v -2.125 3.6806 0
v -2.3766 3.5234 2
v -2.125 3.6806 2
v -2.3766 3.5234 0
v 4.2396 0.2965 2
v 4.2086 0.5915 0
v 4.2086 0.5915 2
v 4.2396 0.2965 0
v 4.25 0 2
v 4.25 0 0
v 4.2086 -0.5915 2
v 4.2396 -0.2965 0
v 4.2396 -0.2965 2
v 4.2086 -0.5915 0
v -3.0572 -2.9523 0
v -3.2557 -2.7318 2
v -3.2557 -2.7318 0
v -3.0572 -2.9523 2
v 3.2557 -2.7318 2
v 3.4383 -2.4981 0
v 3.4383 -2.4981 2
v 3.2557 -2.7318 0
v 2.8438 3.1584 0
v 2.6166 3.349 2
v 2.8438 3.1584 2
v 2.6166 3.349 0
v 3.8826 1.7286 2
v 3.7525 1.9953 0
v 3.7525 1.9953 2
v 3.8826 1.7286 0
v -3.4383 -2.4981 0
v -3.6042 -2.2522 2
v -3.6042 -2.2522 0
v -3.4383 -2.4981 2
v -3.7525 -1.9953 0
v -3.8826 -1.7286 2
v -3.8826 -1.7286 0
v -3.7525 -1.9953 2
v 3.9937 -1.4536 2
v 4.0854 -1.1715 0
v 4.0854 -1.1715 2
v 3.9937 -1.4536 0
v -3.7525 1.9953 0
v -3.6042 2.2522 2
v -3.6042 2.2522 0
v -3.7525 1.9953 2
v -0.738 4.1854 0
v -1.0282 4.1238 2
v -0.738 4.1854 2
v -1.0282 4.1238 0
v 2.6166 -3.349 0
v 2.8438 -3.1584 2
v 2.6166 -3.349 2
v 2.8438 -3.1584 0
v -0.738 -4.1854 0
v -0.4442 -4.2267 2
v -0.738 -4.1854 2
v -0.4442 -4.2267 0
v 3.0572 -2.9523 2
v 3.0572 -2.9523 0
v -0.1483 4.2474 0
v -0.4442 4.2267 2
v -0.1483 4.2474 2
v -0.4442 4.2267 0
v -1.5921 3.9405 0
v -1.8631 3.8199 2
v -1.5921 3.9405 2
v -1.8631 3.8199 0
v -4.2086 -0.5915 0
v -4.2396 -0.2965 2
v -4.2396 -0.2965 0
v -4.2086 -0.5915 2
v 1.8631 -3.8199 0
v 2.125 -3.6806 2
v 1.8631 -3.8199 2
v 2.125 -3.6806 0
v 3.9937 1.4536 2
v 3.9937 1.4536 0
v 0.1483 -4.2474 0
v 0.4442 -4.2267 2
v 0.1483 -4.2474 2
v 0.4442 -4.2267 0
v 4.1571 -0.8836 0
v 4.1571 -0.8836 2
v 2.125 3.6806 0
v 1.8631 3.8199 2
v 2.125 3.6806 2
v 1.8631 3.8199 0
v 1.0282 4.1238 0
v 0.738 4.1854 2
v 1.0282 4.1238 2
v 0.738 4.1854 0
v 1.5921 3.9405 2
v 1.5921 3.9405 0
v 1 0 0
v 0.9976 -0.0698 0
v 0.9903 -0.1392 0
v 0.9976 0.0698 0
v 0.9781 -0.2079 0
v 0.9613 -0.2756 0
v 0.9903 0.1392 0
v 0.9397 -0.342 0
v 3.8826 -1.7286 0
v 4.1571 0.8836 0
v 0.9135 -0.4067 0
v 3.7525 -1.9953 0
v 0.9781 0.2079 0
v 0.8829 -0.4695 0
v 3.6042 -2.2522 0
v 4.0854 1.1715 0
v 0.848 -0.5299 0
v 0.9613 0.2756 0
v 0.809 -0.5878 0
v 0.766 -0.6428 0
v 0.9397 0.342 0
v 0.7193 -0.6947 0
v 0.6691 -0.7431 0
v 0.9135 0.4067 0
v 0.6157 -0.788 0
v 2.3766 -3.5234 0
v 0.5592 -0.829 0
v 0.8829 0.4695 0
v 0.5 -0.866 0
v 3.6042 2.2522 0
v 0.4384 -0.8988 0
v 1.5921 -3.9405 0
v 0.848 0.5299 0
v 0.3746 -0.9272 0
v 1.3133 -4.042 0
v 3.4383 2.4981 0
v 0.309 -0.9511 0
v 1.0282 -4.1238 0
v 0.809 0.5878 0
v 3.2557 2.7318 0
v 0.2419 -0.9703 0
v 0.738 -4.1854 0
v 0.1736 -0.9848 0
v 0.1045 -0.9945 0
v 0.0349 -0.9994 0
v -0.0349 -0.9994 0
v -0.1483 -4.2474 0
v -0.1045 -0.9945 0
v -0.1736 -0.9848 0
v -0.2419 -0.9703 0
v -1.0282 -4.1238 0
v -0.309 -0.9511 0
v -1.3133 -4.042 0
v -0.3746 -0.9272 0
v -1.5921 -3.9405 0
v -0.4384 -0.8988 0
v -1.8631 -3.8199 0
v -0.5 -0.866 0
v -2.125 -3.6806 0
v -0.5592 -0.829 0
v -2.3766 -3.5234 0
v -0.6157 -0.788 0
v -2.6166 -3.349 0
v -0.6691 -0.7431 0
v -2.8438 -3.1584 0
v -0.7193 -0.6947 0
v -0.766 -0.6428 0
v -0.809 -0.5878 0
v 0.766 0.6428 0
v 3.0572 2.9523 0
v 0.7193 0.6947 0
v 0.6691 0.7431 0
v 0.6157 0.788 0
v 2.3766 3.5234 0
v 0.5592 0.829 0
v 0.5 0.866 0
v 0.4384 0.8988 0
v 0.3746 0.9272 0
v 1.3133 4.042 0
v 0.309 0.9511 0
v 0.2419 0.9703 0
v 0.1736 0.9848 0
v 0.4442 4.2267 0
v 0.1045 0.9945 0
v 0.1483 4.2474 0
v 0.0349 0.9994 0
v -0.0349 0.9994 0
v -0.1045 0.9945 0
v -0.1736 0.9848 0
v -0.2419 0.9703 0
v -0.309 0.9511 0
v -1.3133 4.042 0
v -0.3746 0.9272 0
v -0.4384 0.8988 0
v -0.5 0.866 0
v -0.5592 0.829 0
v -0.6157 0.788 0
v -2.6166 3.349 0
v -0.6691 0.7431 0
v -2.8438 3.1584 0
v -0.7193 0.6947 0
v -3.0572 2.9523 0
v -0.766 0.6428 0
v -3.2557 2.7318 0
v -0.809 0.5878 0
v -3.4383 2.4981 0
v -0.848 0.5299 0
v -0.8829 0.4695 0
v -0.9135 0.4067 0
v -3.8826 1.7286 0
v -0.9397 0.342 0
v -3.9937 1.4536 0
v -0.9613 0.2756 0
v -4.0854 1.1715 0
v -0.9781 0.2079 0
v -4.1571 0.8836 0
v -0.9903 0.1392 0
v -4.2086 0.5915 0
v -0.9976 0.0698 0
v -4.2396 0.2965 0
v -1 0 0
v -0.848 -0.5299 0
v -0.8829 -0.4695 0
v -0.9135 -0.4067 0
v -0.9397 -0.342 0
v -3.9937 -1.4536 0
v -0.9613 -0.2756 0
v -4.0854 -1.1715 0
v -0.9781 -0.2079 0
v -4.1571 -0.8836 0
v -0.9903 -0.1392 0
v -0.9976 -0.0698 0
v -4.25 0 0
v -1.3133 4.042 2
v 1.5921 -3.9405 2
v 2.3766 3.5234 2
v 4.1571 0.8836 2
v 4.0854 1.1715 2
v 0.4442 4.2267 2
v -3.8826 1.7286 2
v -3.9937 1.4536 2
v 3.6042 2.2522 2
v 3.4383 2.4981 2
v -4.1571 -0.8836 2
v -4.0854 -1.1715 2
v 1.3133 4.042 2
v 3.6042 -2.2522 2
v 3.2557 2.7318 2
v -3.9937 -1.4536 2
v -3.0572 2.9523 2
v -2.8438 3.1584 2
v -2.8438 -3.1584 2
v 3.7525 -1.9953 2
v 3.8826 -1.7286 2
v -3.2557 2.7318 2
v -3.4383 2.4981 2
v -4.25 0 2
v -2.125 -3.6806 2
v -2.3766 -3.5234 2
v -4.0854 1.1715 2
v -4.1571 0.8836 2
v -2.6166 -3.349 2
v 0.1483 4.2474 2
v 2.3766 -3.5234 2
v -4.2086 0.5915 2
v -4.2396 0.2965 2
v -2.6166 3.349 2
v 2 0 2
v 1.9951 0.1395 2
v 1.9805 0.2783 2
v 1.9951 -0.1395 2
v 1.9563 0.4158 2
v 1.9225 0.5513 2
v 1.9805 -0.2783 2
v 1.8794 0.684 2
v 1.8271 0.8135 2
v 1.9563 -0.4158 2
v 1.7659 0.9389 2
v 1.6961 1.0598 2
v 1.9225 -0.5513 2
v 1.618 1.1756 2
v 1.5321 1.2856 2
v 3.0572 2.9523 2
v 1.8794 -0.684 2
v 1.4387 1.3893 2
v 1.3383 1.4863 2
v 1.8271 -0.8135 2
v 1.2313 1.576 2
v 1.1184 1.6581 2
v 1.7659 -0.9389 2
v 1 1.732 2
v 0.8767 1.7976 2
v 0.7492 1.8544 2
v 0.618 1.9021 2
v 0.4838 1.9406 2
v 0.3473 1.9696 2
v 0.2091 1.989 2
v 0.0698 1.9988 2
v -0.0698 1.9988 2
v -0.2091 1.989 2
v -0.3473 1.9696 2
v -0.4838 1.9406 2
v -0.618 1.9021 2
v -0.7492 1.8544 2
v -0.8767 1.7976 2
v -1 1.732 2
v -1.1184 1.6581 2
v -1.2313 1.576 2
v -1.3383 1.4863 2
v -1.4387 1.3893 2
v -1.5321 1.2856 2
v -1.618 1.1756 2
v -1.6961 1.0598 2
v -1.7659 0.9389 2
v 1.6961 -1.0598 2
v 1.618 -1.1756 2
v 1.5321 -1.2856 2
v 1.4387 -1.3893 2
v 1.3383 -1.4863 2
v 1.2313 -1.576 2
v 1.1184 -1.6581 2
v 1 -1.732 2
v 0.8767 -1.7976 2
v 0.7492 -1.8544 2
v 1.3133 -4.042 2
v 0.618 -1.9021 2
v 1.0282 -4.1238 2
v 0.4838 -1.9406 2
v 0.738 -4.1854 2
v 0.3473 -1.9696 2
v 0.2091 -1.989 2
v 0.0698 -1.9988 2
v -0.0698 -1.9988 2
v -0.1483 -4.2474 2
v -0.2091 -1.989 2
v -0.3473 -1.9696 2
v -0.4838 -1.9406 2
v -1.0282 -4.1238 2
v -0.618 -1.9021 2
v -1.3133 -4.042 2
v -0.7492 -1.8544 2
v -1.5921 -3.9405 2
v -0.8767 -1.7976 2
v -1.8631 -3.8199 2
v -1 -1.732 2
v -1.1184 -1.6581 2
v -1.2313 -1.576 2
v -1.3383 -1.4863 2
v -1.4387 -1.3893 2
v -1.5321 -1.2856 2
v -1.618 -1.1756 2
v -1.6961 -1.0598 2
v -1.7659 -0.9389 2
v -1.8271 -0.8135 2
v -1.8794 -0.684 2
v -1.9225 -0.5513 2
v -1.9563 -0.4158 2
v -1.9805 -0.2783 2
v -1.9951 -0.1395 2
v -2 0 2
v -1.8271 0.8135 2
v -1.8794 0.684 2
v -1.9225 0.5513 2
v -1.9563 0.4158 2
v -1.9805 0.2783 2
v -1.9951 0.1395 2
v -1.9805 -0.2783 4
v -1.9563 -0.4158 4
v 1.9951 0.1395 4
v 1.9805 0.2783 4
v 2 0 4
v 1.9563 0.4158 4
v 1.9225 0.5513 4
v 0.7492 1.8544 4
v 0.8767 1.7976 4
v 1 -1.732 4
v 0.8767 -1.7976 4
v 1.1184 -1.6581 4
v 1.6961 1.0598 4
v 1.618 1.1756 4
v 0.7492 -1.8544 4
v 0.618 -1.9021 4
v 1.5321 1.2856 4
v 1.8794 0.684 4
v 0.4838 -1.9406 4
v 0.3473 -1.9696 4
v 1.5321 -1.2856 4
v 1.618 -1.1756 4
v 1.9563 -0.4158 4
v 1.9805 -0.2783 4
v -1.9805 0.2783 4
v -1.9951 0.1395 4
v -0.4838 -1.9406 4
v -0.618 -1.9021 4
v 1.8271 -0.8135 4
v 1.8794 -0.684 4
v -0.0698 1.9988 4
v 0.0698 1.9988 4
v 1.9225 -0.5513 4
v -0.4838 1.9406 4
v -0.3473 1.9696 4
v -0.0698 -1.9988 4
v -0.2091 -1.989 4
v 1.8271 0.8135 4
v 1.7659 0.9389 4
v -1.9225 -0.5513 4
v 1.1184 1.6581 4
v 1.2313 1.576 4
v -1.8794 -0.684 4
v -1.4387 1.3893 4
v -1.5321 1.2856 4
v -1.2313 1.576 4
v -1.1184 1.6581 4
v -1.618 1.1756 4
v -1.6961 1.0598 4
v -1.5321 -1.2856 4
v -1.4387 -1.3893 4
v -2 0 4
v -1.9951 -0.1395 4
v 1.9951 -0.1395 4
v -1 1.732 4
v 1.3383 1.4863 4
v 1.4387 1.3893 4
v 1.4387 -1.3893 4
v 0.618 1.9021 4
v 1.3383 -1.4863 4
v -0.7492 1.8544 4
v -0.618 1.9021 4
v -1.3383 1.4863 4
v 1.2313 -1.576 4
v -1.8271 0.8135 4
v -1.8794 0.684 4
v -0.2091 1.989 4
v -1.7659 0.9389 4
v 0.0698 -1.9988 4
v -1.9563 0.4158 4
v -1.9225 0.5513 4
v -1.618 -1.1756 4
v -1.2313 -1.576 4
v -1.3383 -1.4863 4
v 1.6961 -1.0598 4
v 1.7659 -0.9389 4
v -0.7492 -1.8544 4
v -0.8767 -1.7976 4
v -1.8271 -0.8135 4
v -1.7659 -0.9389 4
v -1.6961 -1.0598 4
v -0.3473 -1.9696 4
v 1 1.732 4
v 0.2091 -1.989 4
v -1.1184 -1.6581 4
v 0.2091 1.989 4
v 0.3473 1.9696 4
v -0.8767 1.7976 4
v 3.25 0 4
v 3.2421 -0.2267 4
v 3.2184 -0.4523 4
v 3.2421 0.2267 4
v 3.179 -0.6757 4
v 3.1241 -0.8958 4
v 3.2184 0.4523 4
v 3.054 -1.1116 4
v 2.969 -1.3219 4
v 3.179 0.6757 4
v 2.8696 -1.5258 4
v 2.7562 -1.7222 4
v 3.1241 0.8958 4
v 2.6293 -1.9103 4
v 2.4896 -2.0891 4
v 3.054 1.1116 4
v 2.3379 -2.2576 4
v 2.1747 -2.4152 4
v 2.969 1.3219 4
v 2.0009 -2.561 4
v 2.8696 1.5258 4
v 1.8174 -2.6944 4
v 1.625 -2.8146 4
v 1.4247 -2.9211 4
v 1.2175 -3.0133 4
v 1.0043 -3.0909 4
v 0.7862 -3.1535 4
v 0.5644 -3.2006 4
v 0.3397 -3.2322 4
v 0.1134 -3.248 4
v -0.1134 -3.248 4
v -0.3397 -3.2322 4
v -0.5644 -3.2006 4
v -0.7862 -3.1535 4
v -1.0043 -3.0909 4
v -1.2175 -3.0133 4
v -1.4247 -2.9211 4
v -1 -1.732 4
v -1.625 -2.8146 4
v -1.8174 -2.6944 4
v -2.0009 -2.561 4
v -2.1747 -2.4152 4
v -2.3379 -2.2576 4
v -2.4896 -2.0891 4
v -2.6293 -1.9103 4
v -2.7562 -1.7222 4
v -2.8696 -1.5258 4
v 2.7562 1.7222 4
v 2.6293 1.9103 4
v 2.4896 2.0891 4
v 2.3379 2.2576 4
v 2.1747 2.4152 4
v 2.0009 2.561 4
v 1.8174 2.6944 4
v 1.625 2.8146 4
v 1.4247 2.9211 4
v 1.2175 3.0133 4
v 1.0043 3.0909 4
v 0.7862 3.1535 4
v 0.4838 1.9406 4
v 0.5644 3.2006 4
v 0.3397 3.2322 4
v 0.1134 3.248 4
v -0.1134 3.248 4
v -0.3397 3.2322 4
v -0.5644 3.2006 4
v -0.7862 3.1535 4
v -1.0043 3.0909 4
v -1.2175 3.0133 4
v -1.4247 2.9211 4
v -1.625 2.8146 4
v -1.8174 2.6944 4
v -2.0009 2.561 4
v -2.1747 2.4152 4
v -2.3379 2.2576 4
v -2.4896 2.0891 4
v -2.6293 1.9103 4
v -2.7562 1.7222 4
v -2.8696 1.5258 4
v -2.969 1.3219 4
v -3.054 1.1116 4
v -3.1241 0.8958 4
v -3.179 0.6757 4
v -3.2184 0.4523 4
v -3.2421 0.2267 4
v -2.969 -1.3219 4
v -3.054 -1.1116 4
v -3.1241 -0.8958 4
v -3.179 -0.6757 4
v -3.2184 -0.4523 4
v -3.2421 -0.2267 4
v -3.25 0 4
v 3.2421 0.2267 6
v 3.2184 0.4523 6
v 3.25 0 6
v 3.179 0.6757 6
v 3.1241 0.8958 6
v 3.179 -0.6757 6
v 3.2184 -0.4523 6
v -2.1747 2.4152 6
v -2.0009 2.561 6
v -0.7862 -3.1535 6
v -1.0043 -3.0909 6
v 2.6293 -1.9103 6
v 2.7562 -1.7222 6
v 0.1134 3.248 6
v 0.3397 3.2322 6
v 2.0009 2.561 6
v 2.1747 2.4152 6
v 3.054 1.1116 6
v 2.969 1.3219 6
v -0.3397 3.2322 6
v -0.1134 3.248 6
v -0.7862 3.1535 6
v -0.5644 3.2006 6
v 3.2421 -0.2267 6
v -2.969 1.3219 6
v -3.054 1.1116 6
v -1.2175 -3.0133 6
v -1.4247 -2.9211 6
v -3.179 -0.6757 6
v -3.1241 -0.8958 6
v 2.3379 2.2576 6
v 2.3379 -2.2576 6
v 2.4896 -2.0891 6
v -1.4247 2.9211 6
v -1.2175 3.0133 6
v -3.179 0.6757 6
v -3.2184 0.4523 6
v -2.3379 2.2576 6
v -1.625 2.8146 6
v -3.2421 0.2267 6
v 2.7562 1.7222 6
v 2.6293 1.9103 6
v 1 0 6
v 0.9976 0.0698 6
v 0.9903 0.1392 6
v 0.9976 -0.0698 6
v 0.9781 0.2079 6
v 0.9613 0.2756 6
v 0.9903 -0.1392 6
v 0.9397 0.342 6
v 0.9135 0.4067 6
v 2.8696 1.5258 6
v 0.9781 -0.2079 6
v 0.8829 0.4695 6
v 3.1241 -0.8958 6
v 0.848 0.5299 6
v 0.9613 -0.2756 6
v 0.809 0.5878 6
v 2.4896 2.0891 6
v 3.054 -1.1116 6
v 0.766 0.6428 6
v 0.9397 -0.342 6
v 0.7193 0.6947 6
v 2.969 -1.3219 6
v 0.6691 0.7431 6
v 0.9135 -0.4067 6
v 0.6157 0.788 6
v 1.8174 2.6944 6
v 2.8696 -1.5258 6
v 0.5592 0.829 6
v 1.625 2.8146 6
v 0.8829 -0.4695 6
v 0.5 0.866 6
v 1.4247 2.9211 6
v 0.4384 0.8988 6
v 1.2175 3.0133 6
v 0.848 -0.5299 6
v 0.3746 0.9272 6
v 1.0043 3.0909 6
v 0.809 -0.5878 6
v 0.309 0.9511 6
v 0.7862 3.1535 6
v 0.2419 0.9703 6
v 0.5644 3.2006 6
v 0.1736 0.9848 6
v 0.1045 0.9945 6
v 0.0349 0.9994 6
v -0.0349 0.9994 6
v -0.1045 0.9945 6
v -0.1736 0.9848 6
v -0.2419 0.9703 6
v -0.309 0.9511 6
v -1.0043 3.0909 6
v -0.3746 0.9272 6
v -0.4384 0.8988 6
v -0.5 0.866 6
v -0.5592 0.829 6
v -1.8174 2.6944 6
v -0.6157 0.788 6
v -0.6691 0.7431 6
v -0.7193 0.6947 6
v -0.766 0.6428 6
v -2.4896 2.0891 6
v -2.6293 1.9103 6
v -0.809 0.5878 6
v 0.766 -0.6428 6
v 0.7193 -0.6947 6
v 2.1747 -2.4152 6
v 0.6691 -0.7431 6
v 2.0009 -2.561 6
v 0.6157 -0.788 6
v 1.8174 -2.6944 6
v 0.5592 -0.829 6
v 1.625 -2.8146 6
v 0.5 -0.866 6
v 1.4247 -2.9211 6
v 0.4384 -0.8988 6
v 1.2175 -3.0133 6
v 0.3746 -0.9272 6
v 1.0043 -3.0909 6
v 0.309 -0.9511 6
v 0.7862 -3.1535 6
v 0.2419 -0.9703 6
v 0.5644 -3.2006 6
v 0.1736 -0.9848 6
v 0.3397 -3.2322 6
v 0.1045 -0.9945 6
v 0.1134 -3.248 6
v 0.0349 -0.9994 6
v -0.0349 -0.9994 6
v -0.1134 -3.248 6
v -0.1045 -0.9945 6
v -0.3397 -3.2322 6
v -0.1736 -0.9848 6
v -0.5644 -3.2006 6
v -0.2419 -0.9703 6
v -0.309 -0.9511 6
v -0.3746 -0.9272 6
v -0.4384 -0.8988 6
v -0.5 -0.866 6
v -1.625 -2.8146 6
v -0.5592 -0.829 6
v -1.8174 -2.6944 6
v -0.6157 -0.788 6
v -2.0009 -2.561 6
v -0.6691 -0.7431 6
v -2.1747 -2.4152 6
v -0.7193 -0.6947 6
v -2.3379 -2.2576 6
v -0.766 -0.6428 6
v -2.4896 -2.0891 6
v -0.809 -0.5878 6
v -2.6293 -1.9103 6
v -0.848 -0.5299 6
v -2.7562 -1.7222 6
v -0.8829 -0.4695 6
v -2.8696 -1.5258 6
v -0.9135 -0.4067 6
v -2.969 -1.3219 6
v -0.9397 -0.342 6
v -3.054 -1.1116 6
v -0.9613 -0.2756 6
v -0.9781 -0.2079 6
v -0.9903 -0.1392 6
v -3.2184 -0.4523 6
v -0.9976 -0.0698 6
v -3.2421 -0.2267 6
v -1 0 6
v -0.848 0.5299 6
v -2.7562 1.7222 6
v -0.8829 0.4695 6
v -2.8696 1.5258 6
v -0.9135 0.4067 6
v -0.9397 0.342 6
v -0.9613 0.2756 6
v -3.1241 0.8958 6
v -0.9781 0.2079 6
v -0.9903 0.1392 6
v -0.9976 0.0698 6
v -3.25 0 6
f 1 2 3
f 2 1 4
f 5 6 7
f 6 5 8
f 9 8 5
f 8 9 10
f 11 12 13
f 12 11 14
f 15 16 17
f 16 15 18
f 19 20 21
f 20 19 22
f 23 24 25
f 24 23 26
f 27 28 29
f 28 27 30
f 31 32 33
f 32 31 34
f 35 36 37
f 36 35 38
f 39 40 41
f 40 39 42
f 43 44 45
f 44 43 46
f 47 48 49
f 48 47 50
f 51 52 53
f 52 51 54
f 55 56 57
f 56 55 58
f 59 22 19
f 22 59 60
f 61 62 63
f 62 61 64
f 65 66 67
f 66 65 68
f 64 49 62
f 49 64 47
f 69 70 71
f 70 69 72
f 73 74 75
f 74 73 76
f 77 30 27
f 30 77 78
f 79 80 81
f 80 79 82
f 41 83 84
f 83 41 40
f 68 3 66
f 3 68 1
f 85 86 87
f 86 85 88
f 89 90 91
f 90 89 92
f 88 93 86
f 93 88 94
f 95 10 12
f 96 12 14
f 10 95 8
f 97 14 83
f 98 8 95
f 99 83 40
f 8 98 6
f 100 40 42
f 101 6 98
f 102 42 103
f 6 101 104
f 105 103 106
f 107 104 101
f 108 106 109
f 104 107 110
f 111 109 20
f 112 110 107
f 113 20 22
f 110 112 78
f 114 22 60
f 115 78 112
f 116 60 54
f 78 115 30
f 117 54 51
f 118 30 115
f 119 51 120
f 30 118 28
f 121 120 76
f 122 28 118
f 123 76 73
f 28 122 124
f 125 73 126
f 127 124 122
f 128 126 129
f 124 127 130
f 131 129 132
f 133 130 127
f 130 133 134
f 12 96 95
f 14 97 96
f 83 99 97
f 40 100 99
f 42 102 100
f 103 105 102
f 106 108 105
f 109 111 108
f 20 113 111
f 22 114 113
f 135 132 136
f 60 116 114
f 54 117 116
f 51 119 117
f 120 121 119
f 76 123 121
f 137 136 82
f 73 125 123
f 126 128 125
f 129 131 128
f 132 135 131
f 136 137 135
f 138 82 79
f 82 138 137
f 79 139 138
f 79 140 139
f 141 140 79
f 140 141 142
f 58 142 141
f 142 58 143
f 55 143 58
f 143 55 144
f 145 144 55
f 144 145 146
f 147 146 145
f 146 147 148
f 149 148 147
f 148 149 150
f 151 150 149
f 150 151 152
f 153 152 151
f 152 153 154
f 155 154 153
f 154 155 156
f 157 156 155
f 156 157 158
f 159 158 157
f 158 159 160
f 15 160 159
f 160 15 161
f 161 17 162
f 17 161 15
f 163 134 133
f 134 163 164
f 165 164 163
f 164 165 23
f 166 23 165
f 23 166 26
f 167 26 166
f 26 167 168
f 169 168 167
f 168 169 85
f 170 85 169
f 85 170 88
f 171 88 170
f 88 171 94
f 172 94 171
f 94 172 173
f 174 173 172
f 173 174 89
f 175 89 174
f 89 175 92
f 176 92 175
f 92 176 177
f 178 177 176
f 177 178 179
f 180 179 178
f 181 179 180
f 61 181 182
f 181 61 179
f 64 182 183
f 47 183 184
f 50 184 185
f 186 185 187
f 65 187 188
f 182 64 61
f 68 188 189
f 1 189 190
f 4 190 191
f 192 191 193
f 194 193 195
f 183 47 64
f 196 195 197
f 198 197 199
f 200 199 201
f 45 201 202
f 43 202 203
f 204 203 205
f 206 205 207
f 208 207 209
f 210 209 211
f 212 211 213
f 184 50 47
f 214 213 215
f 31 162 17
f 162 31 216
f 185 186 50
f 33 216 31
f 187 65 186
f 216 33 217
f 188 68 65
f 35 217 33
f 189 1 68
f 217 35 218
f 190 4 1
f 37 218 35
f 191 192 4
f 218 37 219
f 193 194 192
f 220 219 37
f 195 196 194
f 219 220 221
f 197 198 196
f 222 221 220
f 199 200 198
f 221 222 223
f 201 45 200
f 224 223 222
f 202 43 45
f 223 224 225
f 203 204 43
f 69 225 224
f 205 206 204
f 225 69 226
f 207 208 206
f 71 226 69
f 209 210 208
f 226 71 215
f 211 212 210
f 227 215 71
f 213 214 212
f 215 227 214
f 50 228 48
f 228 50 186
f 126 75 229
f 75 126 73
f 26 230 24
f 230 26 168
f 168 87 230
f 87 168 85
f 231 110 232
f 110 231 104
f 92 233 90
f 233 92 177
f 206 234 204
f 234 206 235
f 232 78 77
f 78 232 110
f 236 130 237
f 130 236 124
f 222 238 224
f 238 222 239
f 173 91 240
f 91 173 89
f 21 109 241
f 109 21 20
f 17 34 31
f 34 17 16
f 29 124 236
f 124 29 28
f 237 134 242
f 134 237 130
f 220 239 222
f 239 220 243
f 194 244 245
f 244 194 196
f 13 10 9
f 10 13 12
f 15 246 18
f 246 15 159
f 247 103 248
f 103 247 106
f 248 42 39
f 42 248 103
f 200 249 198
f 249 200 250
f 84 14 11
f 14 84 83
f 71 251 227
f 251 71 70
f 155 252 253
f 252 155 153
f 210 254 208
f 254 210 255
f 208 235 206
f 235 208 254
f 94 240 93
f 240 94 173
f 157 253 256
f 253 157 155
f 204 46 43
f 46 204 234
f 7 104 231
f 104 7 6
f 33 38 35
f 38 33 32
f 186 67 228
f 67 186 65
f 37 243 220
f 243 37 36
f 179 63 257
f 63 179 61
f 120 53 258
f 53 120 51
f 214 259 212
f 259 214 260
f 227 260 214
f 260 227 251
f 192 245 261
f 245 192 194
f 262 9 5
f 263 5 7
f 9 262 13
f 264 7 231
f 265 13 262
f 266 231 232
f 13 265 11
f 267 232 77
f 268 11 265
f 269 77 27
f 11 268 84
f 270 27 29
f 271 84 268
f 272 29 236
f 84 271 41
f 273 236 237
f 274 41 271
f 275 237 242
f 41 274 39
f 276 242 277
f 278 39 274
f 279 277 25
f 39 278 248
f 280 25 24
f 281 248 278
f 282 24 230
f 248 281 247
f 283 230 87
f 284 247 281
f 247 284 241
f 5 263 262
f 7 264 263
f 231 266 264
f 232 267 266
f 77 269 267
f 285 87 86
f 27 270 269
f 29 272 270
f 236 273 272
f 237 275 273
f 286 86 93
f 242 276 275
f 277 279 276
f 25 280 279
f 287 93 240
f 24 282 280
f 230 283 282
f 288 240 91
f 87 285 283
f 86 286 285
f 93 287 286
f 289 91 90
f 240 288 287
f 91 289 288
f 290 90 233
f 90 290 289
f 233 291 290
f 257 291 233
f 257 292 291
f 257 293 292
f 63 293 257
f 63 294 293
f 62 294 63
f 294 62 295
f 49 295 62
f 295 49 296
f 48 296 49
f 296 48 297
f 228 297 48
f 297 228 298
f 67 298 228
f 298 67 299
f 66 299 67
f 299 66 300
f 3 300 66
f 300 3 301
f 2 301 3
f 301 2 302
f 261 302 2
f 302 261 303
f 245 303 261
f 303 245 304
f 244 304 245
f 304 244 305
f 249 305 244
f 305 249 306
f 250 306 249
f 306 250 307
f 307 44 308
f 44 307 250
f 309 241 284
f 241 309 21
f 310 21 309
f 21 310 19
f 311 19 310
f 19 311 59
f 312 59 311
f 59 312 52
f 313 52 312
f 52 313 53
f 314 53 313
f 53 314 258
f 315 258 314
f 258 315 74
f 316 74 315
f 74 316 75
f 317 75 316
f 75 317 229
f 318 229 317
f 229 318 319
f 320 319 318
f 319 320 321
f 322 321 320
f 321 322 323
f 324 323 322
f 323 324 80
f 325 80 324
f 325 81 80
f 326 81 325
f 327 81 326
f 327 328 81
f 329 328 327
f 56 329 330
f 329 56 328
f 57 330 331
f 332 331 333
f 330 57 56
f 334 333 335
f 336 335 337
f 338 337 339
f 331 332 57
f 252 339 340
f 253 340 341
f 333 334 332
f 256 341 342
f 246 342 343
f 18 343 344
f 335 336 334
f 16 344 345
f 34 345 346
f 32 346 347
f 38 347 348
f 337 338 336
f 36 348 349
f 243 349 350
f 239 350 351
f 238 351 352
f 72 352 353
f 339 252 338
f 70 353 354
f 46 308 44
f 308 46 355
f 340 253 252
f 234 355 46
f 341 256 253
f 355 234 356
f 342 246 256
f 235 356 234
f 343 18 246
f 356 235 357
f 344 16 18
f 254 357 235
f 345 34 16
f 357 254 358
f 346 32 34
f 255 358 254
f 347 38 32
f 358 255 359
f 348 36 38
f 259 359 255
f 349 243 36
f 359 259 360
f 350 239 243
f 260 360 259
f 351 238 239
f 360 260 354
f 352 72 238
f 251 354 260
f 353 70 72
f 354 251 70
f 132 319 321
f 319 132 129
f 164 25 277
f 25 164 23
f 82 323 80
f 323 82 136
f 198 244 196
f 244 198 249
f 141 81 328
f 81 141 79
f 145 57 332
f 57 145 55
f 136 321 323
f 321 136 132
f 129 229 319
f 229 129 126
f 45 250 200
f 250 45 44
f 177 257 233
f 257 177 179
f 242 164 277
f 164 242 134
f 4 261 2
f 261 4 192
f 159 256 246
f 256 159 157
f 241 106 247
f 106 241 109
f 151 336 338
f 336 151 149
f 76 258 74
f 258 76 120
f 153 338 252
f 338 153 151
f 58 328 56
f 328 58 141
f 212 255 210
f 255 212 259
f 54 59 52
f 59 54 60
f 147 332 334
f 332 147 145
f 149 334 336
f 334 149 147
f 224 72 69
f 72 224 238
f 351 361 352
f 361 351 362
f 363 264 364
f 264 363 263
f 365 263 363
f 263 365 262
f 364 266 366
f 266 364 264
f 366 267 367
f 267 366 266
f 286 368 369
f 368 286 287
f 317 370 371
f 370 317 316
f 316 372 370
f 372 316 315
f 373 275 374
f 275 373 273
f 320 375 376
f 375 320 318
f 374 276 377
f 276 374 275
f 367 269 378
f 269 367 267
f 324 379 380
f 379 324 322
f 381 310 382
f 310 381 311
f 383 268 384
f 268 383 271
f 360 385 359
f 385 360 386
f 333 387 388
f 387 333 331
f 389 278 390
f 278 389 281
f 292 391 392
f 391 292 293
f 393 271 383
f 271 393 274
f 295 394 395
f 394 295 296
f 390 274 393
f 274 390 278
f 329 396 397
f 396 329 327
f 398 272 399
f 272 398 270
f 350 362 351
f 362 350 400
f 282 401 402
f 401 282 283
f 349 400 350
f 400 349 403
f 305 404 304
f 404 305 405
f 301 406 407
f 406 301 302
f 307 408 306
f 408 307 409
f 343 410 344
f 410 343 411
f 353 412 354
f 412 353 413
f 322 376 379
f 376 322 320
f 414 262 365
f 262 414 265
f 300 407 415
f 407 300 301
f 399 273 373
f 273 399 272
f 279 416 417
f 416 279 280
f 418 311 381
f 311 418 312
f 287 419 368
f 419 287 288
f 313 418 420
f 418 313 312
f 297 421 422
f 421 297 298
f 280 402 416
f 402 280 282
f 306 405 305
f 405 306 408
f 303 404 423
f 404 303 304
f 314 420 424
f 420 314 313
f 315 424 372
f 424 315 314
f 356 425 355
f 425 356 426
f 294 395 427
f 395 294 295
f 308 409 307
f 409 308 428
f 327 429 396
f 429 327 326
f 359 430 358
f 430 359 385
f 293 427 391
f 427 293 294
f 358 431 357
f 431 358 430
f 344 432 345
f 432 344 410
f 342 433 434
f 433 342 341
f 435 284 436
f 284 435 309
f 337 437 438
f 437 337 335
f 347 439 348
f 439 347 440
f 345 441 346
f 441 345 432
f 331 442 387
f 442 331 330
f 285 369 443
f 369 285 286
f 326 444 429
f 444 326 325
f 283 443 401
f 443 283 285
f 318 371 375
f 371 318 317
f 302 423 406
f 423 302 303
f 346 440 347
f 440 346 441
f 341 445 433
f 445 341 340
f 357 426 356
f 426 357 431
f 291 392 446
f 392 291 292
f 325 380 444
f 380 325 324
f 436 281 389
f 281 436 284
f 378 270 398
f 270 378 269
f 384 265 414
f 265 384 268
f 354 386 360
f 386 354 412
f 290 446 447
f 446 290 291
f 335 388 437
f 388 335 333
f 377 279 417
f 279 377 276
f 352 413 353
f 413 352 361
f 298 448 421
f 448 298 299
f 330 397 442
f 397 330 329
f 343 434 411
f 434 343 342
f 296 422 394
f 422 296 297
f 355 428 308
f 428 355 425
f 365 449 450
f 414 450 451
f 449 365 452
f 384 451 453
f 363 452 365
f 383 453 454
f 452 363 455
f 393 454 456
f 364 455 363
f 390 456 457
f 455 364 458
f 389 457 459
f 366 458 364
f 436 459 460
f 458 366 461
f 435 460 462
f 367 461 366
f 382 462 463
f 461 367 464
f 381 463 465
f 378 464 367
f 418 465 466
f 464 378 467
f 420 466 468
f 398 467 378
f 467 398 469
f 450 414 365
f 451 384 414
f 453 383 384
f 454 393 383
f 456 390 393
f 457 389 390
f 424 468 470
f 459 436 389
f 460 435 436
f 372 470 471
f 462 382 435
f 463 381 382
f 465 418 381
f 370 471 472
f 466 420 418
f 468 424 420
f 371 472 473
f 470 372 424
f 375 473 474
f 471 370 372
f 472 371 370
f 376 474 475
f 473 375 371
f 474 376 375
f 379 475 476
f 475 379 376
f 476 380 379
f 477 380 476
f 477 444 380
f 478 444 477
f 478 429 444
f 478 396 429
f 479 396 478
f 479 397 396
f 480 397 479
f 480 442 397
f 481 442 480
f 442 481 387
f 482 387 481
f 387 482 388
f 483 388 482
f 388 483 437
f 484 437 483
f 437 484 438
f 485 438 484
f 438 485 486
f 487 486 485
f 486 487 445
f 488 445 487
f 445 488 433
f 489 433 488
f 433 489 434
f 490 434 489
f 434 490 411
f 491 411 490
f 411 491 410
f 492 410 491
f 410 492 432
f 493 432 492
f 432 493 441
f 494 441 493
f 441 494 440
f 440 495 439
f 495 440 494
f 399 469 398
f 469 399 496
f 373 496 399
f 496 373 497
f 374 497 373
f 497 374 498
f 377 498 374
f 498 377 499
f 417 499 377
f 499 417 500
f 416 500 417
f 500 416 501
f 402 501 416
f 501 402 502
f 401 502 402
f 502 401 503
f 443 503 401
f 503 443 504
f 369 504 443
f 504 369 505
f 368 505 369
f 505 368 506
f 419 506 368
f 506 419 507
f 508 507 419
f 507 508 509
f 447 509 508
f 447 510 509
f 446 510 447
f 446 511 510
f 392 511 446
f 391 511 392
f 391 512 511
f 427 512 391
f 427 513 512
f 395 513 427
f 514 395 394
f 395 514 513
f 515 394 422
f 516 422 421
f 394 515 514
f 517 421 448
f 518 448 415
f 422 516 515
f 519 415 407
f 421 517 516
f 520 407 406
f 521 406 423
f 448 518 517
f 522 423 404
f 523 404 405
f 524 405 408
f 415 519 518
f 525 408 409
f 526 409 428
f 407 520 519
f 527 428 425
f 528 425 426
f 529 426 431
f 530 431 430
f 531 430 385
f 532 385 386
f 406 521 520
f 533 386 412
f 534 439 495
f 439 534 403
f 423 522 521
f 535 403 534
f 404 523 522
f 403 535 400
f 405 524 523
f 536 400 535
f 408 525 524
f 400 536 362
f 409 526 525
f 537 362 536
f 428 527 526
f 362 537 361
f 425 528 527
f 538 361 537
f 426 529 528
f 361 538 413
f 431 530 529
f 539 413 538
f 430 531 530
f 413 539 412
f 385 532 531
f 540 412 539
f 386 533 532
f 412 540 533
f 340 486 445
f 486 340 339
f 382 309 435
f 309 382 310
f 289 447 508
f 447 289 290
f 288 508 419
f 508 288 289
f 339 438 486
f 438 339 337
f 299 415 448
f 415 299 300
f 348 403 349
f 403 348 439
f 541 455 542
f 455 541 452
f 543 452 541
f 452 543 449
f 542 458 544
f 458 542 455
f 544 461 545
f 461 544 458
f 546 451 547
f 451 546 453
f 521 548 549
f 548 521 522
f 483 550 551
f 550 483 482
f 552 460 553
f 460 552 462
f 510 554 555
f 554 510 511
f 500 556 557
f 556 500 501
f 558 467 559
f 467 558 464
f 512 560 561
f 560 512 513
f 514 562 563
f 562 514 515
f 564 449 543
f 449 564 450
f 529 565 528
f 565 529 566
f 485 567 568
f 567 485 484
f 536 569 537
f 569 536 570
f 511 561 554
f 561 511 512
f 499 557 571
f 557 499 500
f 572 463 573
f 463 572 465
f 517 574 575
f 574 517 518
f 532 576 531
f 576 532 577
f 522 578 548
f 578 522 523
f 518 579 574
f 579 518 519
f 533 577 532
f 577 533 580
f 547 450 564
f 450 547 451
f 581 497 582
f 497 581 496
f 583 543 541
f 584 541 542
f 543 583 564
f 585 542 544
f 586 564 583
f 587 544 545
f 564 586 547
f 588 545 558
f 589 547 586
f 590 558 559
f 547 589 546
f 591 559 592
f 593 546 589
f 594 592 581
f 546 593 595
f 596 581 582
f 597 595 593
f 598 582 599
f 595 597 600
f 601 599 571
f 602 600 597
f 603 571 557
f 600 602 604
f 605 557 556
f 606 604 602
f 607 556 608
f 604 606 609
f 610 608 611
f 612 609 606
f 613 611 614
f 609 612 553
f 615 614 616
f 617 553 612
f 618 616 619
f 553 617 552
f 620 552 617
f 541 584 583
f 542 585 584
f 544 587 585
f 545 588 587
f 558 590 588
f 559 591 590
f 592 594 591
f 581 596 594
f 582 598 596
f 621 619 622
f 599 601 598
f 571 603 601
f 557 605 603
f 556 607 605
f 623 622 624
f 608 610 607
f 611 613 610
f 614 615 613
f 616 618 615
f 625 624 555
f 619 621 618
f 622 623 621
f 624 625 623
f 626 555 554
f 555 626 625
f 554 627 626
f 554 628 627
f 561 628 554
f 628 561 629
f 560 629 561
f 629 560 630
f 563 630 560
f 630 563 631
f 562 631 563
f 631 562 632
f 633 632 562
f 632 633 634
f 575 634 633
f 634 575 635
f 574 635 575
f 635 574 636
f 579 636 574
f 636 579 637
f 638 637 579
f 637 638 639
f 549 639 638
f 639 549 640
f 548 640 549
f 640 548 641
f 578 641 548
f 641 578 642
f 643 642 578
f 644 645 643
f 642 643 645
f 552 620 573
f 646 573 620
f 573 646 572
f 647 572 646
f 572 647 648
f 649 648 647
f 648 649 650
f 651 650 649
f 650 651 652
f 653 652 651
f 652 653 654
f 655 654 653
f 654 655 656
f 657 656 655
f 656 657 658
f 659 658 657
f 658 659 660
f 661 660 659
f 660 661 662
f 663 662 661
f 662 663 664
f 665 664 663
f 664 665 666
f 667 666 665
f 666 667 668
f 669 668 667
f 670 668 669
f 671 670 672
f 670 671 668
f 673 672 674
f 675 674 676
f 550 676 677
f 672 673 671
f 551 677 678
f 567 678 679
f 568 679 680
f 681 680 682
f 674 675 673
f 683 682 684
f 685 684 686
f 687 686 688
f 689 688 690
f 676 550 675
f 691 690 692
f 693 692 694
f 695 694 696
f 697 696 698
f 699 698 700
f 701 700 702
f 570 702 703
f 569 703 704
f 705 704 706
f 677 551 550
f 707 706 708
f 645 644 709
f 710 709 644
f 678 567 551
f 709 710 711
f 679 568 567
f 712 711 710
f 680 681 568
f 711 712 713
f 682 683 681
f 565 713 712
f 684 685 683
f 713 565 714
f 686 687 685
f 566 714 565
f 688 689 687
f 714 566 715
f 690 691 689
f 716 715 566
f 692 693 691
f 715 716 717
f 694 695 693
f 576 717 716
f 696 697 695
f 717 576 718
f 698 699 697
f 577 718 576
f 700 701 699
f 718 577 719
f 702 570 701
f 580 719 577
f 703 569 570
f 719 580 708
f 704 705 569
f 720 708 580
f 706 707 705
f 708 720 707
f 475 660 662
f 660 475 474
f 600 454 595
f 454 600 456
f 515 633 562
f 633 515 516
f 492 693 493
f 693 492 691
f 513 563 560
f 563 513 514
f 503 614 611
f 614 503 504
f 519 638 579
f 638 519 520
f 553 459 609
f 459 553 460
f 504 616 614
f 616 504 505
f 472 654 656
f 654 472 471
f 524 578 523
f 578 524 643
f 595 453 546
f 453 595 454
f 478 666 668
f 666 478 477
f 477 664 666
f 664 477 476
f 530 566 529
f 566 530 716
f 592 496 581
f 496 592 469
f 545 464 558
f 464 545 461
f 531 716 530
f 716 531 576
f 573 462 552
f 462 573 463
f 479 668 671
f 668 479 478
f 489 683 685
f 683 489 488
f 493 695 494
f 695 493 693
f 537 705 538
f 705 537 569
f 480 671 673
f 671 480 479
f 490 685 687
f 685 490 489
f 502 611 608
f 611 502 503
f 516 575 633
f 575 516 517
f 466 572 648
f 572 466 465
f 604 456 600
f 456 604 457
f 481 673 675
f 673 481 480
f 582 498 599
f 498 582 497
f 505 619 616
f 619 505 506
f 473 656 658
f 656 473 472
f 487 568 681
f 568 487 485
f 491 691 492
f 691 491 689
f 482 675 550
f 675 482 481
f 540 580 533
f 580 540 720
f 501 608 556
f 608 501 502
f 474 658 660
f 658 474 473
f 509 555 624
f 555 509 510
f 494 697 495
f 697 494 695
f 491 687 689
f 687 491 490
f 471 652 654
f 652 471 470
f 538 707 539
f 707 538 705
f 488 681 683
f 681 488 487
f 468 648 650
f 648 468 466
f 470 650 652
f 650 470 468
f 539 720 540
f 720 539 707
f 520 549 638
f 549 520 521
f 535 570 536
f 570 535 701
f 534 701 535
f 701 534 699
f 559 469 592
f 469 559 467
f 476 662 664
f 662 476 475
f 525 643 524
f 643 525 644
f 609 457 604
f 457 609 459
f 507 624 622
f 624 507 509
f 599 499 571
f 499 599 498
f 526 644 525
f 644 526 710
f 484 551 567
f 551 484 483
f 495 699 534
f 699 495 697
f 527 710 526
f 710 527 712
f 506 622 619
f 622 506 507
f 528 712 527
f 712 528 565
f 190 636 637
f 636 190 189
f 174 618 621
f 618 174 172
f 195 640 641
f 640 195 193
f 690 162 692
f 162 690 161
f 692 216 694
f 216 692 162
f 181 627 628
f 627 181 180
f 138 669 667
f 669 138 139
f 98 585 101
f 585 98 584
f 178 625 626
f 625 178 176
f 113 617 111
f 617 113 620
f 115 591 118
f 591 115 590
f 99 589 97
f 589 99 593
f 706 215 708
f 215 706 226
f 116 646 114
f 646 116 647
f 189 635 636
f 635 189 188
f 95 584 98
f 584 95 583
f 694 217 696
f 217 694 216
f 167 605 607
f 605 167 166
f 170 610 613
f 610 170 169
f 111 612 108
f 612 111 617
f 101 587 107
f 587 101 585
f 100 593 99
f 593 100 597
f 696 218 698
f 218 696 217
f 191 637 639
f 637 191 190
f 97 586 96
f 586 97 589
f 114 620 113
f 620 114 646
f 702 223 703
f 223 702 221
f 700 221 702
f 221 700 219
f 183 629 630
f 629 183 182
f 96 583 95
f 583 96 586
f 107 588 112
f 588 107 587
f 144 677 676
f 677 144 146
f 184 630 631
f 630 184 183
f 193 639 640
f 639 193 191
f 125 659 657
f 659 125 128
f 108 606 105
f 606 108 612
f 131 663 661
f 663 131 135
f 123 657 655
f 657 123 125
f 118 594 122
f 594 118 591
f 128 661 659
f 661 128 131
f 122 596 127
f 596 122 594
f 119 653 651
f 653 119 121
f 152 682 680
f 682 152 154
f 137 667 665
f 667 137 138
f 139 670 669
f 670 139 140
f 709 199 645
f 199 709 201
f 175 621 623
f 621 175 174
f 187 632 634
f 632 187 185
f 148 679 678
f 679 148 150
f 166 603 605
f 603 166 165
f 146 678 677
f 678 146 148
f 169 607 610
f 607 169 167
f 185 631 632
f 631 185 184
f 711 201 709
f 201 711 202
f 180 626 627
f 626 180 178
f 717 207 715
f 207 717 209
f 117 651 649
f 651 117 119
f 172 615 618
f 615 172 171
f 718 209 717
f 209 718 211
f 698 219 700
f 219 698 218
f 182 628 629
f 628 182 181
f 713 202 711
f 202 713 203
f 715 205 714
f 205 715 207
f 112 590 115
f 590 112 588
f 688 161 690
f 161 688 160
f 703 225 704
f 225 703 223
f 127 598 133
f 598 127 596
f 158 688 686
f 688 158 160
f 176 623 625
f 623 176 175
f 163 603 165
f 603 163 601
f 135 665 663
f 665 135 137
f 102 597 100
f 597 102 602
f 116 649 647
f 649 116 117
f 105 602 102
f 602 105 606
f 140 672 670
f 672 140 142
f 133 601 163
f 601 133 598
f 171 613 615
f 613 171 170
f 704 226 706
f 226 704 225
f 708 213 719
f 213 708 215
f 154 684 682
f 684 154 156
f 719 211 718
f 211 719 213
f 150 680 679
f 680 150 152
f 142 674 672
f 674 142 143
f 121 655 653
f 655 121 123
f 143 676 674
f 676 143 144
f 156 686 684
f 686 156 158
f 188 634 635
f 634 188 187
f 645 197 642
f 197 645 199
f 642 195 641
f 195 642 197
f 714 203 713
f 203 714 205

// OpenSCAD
// based on the old code from discontinued repository: 
// https://github.com/kubikji2/useful-models/tree/master

$fn = 90;
eps = 0.01;

nail_d = 2;
inner_d = 4;
outer_d = 6.5;

difference()
{
    // main body
    union()
    {
        cylinder(d=outer_d+2, h=2);
        translate([0,0,2])
            cylinder(d=inner_d,h=2);
        translate([0,0,4])
            cylinder(d=outer_d,h=2);
    }

    // nail hole
    translate([0,0,-eps])
        cylinder(d=nail_d,h = 7++2*eps);
    
}
